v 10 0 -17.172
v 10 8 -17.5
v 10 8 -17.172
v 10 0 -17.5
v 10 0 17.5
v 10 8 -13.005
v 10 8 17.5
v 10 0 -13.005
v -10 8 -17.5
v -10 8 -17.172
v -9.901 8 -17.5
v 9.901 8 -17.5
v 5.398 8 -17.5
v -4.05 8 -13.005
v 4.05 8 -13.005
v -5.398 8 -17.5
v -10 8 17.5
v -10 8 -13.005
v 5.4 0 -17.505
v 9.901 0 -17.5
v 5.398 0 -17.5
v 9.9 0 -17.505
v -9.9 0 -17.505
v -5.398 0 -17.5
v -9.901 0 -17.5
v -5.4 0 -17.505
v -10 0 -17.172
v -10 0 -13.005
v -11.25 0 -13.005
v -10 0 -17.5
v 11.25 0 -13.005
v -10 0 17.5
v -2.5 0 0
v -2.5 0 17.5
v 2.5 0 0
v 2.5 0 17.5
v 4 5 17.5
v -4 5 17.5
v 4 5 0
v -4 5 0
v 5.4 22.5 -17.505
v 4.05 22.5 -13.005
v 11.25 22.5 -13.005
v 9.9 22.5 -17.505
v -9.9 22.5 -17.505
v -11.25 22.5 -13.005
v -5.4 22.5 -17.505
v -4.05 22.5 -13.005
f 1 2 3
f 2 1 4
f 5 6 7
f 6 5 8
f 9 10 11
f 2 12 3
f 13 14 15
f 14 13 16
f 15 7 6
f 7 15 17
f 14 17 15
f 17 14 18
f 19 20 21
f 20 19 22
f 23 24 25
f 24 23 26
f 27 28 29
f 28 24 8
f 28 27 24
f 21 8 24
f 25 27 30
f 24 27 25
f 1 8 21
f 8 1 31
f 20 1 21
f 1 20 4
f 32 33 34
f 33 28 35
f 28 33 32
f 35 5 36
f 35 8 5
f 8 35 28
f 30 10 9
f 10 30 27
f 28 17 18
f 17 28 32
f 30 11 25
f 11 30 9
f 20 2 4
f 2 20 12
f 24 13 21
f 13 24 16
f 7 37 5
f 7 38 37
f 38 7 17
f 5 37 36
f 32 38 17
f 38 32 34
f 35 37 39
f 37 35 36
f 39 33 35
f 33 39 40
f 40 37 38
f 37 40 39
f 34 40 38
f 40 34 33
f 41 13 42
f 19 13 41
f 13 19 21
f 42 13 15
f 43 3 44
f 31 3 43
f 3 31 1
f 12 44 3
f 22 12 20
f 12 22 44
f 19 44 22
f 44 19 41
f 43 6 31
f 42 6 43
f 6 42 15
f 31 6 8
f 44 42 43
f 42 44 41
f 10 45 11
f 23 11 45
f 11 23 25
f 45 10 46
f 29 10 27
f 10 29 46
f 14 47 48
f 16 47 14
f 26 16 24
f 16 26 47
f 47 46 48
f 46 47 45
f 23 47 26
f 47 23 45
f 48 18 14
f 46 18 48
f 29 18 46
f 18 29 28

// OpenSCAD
// file: include.scad
//////////////////      END SECTION       //////////////////

	module added_pins(){
		difference(){
			union(){
				translate([30/(15/4),obj_leg*leg_length,30/(15/4)]) pin();
				translate([30/(15/4)+14.5,obj_leg*leg_length,30/(15/4)+14]) pin();
			}
			union(){
							translate([30/(15/4)+13.5,obj_leg*leg_length-20,30/(15/4)+5])cube(size=[2,40,15]);
							translate([30/(15/4)+7.5,obj_leg*leg_length-20,30/(15/4)+15])rotate([0,90,0]) cube(size=[2,40,15]);	

							translate([30/(15/4)-1,obj_leg*leg_length-20,30/(15/4)-8])cube(size=[2,40,15]);
							translate([30/(15/4)-10,obj_leg*leg_length-20,30/(15/4)+1])rotate([0,90,0]) cube(size=[2,40,15]);
			}
		}
	}
	module taken_pins() {
		translate([30/(15/4)+14,obj_leg*leg_length-10,30/(15/4)]) mirror_pin();
		translate([30/(15/4),obj_leg*leg_length-10,30/(15/4)+15]) mirror_pin();
	}


//////////////////      OTHER STUFF       //////////////////

	module holes() {
		rotate([0,0,90]) for(y=[0:other_holes])
		translate([obj_leg+y*15,-15.5,7.5]) union() {
			translate([7.5,0,15]) hole_up();
			hole_down();
		}
	}
	module extend_holes() {
	module top(){
		rotate([0,0,90]) for(y=[0:other_holes+1])
		translate([(30/4)+y*15,-15.5,7.5]) union() {
			translate([7.5,0,15]) hole_up();
		}
	}
	module bottom(){
		rotate([0,0,90]) for(y=[0:other_holes+2])
		translate([(30/4)+y*15,-15.5,7.5]) union() {
			hole_down();
		
}
	}
	union(){
		top();
		bottom();
	}
	}

	module hole() {
		union() {
			rotate([90, 90, 0]) cylinder(h=40, d=hole_pin_diameter, center=true);
			translate([0,7.5,0]) sphere(d=hole_ball_size);
			translate([0,-6,0]) sphere(d=hole_ball_size);
		}
	}
	module hole_up() {
		union() {
			rotate([90, 90, 0]) cylinder(h=40, d=hole_pin_diameter, center=true);
			translate([0,7.5,10]) cylinder(h=hole_pin_height, d=hole_pin_diameter, center=true);
			translate([0,-6,10]) cylinder(h=hole_pin_height, d=hole_pin_diameter, center=true);
			translate([0,7.5,0]) sphere(d=hole_ball_size);
			translate([0,-6,0]) sphere(d=hole_ball_size);
		}
	}
	module hole_down() {
		union() {
			rotate([90, 90, 0]) cylinder(h=40, d=hole_pin_diameter, center=true);
			translate([0,7.5,-10]) cylinder(h=hole_pin_height, d=hole_pin_diameter, center=true);
			translate([0,-6,-10]) cylinder(h=hole_pin_height, d=hole_pin_diameter, center=true);
			translate([0,7.5,0]) sphere(d=hole_ball_size);
			translate([0,-6,0]) sphere(d=hole_ball_size);
		}
	}
	module pin() {
		union() {
			rotate([90, 90, 0]) cylinder(h=pin_height, d=pin_diameter, center=true);
			translate([0,7.5,0]) sphere(d=ball_size);
		}
	}

	module mirror_pin() {
		rotate([90, 90, 0]) cylinder(h=hole_pin_height+small_number, d=hole_pin_diameter, center=true);
		translate([0,-(pin_height-(ball_size/2)),0]) sphere(d=ball_size);
	}


//////////////////      SOME RACK AND Z THINGS       //////////////////

module z_holes() {
    rotate([0,-90,0]) for(z=[0:z_hole_number])
    translate([22.5+z*15,16,-12])
        hole();
}

module pin_cuts() {
	union(){
		cube(size=[2,10,40], center=true);
		rotate([0,0,90]) cube(size=[2,10,40], center=true);
	}
}
module pin_uncut() {
	union(){
		rotate([0, 0, 90]) cylinder(h=hole_pin_height, d=hole_pin_diameter, center=true);
		translate([0,0,10]) sphere(d=ball_hole);
	}
}


module pin_out() {
	union(){
		rotate([0, 0, 90]) cylinder(h=pin_height, d=pin_diameter, center=true);
		translate([0,0,10]) sphere(d= ball_size);
	}
}


module pins_z(){
	difference() {
		pin_out();
		pin_cuts();
	}
}
//////////////////      RACK AND SLIDE     ///////////////////

module straight_pins() {
	for(z=[0:((((obj_leg*leg_length)*2)-(obj_leg*2))/3)/14.5]) rotate([-90,0,0]) translate([z*15,30/(15/4),14]) pins_z();
	for(z=[0:((((obj_leg*leg_length)*2)-(obj_leg*2))/3)/14.5]) rotate([-90,0,0]) translate([z*15,30/(15/4)-14,14]) pins_z();
}
module stagger_pins() {
	for(z=[0:((((obj_leg*leg_length)*2)-(obj_leg*2))/3)/14.5]) rotate([-90,0,0]) translate([z*15,30/(15/4),14]) pins_z();
	for(z=[0:((((obj_leg*leg_length)*2)-(obj_leg*2))/3)/14.5]) rotate([-90,0,0]) translate([z*15+7,30/(15/4)-14,14]) pins_z();
}


//////////////////      DOVE TAIL       //////////////////

module male_dovetail(height) {
	dovetail_3d(max_width,min_width,depth,height);
}

module dovetail_3d(max_width=11, min_width=5, depth=5, height=30) {
	linear_extrude(height=height, convexity=2)
		dovetail_2d(max_width,min_width,depth);
}

module dovetail_2d(max_width=11, min_width=5, depth=5) {
	angle=atan((max_width/2-min_width/2)/depth);
	echo("angle: ", angle);
	polygon(paths=[[0,1,2,3,0]], points=[[-min_width/2,0], [-max_width/2,depth], [max_width/2, depth], [min_width/2,0]]);
}

//bow tie
	module tie_end(height){
				rotate([0,0,0]) translate([0,-0.01,((obj_leg/2)/2)]) male_dovetail(height);
				rotate([0,90,0]) translate([0,-0.01,((obj_leg/2)/2)]) male_dovetail(height);
				rotate([0,180,0]) translate([0,-0.01,((obj_leg/2)/2)]) male_dovetail(height);
				rotate([0,-90,0]) translate([0,-0.01,((obj_leg/2)/2)]) male_dovetail(height);
	}

module bow_support(){
	difference(){
		intersection(){
			translate([-15,0,-15]) cube([30,9,30]);
			scale([1.05,1.05,1.05]) rotate([0,45,0]) tie_end();
		}
		cube([29.2,29.2,29.2], center=true);
	}
}

	module wrap(){
		depth = 30;
				translate([-15,30,15]) rotate([90,180,90]) male_dovetail(height=depth);
				rotate([0,90,0]) translate([-15,30,15]) rotate([90,180,90]) male_dovetail(height=depth);
				rotate([0,180,0]) translate([-15,30,15]) rotate([90,180,90]) male_dovetail(height=depth);
				rotate([0,-90,0]) translate([-15,30,15]) rotate([90,180,90]) male_dovetail(height=depth);
	}
// file: globals.scad
/*
Most things in this file is represented as one millimeter, so keep that in mind while changing things.
Some of the setting are not mm but at variables that you can set, such as 2*x=2x and you are setting what x is.
I will try to specify when things are variables and not exact measurements.
*/

obj_leg = 30;
leg_length = 5.5;
small_number = 0.001;
metal_core_rode_global = 5;


///////////////// number of holes /////////////////////
z_hole_number = 8;
other_holes = 8;

///////////////// Pins /////////////////////

//pins that poke out
ball_size = 10;
pin_height = 20;
pin_diameter = 6;


//holes
hole_ball_size = ball_size;
hole_pin_height = pin_height;
hole_pin_diameter = pin_diameter;

///////////////// Z THINGS /////////////////////

berring_slot_width = 7.5;
berring_slot_depth = 6.5;
metal_core_rode = 5;

///////////////// X THINGS /////////////////////

//male dove tails
max_width=8;
min_width=5;
depth=5;
height=obj_leg/2;

//female dove tails, this is found on the y mounts
girl_max_width=11;
girl_min_width=5;
girl_depth=5;
girl_height=obj_leg;


///////////////// Y THINGS /////////////////////
/*
The Y is so normal that all of those global variables at the top should change all of the setting in it, this section is set her incase there are variables set in the future development of this project.
*/
// main file
include <globals.scad>;
include <include.scad>;

module main(){
	difference(){
		translate([0,0,4]) cube([20,35,8], center=true);
		#rotate([90,0,0]) translate([0,0,0]) male_dovetail(25);
	}

	scale([.9,.9,.9]) translate([8.5,19.45,0]) rotate([0,0,180]) male_dovetail(25);
	scale([.9,.9,.9]) translate([-8.5,19.45,0]) rotate([0,0,180]) male_dovetail(25);
}

rotate([-90,0,0]) main();
